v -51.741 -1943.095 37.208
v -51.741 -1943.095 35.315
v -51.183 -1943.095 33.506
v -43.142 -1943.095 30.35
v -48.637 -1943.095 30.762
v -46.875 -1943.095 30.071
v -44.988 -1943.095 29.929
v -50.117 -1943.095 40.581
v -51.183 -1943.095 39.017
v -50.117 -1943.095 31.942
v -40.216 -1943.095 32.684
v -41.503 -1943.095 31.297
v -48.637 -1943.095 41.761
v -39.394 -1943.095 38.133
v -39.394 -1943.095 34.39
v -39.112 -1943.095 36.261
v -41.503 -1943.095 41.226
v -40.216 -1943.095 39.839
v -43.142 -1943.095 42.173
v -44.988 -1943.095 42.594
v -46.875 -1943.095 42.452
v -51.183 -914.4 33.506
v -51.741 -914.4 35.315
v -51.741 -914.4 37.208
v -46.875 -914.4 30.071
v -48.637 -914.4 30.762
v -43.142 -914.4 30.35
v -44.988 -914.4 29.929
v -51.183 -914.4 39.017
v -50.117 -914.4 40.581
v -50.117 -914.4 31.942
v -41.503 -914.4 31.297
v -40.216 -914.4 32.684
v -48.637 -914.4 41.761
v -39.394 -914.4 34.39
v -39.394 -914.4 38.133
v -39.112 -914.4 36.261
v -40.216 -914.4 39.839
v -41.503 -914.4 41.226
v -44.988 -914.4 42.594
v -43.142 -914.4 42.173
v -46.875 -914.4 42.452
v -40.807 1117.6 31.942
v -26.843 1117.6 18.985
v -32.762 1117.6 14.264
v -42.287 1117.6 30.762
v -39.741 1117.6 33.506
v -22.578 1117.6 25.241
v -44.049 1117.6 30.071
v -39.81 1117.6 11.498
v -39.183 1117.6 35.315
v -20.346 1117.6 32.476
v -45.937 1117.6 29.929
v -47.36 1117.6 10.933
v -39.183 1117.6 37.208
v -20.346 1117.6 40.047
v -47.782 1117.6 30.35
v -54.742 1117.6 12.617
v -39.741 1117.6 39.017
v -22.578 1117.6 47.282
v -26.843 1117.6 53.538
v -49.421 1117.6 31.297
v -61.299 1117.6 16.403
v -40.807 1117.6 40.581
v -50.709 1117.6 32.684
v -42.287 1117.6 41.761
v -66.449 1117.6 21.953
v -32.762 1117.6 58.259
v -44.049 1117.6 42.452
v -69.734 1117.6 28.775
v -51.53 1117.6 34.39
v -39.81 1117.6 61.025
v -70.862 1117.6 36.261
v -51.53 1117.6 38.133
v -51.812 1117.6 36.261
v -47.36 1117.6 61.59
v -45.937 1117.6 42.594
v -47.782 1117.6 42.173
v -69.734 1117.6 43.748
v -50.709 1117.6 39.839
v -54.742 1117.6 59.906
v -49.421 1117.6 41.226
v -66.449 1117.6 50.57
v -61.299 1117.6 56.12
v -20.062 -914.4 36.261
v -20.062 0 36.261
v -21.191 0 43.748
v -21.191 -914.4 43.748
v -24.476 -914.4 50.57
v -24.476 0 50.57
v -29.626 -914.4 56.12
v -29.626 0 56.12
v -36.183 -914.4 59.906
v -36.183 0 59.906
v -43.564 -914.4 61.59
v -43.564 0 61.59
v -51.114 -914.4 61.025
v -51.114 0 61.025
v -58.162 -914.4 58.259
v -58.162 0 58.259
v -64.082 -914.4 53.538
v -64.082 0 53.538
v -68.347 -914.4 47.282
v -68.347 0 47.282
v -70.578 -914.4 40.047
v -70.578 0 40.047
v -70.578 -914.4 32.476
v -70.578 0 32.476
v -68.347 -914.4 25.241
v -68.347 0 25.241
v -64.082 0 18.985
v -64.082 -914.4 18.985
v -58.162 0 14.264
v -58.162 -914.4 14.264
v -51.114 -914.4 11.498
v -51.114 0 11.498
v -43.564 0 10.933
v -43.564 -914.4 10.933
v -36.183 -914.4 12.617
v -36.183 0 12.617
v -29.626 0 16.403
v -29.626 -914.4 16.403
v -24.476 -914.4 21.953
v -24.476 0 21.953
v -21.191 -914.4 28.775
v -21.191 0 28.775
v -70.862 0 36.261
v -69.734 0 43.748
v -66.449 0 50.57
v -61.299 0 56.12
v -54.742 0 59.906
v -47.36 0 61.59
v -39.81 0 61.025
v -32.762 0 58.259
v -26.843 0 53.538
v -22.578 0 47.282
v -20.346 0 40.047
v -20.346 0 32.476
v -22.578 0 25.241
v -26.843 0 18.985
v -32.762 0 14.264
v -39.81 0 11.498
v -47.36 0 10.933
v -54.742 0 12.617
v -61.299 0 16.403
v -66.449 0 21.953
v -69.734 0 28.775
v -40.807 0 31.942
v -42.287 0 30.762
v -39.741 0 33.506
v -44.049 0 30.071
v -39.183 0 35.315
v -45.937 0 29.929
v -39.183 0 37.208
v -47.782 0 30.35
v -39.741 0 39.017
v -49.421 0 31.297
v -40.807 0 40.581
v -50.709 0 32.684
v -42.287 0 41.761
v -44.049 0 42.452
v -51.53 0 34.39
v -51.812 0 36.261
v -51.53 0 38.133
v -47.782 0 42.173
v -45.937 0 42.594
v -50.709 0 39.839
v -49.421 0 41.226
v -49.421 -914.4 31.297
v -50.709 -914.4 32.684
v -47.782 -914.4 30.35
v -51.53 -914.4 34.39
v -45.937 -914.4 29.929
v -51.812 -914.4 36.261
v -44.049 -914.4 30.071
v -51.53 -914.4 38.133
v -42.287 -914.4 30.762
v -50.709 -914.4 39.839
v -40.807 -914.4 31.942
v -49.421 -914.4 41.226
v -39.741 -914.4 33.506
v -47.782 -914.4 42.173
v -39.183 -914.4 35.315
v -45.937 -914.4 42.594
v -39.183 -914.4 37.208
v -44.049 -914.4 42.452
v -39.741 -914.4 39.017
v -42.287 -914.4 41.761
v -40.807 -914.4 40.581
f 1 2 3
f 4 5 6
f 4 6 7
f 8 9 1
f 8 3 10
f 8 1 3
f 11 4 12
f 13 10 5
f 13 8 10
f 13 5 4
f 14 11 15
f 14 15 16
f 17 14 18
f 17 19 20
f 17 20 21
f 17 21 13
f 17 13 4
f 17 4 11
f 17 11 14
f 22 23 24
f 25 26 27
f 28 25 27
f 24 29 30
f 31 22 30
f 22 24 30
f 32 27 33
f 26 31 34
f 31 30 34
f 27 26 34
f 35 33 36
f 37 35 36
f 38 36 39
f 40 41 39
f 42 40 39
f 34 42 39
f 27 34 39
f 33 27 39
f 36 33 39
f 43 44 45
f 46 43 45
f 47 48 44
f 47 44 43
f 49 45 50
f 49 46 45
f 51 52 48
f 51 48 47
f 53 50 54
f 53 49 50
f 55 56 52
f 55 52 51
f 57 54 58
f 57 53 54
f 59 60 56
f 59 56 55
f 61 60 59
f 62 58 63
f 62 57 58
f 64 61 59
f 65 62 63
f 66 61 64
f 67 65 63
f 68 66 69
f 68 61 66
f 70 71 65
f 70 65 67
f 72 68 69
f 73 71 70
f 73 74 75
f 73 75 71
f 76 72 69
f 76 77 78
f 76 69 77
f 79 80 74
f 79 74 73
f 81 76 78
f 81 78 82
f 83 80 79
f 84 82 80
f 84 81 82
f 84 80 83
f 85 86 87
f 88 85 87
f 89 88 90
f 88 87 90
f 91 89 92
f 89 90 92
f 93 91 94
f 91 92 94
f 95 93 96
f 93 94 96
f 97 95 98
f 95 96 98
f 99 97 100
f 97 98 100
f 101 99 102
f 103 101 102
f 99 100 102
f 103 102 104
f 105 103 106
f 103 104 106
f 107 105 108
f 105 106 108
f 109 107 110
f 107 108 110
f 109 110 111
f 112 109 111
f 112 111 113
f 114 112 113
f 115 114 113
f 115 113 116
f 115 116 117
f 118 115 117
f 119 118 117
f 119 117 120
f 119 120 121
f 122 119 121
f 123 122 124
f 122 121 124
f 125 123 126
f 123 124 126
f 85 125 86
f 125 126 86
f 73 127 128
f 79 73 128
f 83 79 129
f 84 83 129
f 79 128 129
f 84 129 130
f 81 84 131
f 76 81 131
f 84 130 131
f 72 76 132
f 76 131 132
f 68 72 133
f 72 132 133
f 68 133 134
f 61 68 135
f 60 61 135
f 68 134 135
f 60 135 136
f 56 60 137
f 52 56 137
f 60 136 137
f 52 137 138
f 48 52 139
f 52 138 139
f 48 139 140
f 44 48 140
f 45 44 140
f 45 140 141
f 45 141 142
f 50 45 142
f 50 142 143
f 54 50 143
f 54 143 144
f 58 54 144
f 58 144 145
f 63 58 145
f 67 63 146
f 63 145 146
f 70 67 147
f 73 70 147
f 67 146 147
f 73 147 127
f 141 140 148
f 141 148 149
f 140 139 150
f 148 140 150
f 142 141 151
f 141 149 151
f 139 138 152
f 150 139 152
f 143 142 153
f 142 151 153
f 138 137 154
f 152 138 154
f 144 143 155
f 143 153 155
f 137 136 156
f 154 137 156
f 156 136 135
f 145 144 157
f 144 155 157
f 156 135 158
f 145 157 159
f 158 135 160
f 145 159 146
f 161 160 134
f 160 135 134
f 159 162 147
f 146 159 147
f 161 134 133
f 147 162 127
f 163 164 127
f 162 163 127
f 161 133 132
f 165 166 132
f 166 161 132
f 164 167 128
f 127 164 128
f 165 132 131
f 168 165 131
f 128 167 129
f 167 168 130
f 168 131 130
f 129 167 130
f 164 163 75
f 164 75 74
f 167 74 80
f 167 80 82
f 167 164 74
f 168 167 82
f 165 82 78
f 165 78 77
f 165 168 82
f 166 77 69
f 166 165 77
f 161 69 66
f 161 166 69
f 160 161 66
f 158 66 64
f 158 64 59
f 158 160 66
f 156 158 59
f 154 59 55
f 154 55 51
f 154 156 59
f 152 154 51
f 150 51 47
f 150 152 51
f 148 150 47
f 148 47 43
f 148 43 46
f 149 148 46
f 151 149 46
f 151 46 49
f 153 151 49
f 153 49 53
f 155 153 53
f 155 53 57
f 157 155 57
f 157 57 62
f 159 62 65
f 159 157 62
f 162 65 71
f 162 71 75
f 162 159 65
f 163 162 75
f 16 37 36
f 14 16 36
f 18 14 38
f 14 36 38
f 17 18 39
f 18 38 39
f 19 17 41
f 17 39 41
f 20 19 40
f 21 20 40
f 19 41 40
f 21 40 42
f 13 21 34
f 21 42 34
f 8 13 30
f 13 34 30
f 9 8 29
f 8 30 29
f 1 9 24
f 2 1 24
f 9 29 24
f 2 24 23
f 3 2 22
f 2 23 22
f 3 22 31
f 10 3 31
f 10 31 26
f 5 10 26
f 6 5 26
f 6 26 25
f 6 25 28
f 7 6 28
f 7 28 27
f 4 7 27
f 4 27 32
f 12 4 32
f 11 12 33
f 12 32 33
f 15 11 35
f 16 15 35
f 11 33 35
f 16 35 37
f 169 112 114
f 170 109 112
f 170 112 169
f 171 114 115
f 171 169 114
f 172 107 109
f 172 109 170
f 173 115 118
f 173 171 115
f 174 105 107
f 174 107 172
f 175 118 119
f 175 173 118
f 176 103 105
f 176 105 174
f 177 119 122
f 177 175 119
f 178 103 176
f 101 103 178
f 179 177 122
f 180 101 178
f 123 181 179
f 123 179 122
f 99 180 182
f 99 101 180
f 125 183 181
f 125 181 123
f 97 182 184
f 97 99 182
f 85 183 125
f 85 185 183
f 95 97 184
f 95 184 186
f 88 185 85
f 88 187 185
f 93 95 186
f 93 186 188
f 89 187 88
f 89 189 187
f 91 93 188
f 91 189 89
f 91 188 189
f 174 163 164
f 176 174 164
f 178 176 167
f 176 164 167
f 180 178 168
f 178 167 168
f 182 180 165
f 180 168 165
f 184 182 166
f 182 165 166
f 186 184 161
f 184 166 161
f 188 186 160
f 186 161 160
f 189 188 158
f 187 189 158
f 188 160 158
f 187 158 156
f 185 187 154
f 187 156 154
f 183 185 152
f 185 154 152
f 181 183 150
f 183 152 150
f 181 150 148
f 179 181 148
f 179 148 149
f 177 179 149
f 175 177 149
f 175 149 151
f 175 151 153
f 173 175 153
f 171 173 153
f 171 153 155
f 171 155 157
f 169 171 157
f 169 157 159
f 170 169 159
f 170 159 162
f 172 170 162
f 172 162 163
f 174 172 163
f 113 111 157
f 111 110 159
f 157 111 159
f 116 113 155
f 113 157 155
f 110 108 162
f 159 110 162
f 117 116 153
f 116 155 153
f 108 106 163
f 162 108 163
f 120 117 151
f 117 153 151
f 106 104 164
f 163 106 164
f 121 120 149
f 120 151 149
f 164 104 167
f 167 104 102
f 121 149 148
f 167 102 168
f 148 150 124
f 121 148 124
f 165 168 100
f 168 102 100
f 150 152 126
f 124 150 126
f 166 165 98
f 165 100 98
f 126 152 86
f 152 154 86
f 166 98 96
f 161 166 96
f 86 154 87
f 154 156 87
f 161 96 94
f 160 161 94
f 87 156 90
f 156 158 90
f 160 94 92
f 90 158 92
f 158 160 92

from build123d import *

# Parameters (mm, degrees)
F0_R       = 25.4
F1_DEPTH   = 914.4
F1_FACE1_R = 25.4
F2_R       = 6.35
F3_DEPTH   = 1028.69492
F4_R       = 6.35
F5_DEPTH   = 1028.69492
F6_R       = 25.4
F6_R_2     = 6.35
F7_DEPTH   = 1117.6


# Not quite as in the source:
# - an extrude ends at something that could not be found from the text; its depth is read off the source's solid


with BuildPart() as f1:
    # F0 (on Front) → F1 (new body)
    with BuildSketch(Plane.XZ):
        with Locations((-45.4621687531, 36.2614989281)):
            Circle(F0_R)
    extrude(amount=F1_DEPTH)

    # F1_face1 (on face) + F2 (on face) → F3 (cut, through all)
    with BuildSketch(Plane(origin=(-45.4621687531, -914.4, 36.2614989281), x_dir=(1, 0, 0), z_dir=(0, -1, 0))):
        Circle(F1_FACE1_R)
    with BuildSketch(Plane(origin=(0, 0, 0), x_dir=(-1, 0, 0), z_dir=(0, 1, 0))):
        with Locations((45.4621687531, 36.2614989281)):
            Circle(F2_R)
    extrude(amount=F3_DEPTH, dir=(0, -1, 0), mode=Mode.SUBTRACT)


with BuildPart() as f5:
    # F4 (on face) → F5 (new body)
    with BuildSketch(Plane.XZ.offset(914.4)):
        with Locations((-45.4621687531, 36.2614989281)):
            Circle(F4_R)
    extrude(amount=F5_DEPTH)


with BuildPart() as f7:
    # F6 (on face) → F7 (new body)
    with BuildSketch(Plane(origin=(0, 0, 0), x_dir=(-1, 0, 0), z_dir=(0, 1, 0))):
        with Locations((45.4621687531, 36.2614989281)):
            Circle(F6_R)
        with Locations((45.4621687531, 36.2614989281)):
            Circle(F6_R_2, mode=Mode.SUBTRACT)
    extrude(amount=F7_DEPTH)


solid = Compound([f1.part, f5.part, f7.part])
